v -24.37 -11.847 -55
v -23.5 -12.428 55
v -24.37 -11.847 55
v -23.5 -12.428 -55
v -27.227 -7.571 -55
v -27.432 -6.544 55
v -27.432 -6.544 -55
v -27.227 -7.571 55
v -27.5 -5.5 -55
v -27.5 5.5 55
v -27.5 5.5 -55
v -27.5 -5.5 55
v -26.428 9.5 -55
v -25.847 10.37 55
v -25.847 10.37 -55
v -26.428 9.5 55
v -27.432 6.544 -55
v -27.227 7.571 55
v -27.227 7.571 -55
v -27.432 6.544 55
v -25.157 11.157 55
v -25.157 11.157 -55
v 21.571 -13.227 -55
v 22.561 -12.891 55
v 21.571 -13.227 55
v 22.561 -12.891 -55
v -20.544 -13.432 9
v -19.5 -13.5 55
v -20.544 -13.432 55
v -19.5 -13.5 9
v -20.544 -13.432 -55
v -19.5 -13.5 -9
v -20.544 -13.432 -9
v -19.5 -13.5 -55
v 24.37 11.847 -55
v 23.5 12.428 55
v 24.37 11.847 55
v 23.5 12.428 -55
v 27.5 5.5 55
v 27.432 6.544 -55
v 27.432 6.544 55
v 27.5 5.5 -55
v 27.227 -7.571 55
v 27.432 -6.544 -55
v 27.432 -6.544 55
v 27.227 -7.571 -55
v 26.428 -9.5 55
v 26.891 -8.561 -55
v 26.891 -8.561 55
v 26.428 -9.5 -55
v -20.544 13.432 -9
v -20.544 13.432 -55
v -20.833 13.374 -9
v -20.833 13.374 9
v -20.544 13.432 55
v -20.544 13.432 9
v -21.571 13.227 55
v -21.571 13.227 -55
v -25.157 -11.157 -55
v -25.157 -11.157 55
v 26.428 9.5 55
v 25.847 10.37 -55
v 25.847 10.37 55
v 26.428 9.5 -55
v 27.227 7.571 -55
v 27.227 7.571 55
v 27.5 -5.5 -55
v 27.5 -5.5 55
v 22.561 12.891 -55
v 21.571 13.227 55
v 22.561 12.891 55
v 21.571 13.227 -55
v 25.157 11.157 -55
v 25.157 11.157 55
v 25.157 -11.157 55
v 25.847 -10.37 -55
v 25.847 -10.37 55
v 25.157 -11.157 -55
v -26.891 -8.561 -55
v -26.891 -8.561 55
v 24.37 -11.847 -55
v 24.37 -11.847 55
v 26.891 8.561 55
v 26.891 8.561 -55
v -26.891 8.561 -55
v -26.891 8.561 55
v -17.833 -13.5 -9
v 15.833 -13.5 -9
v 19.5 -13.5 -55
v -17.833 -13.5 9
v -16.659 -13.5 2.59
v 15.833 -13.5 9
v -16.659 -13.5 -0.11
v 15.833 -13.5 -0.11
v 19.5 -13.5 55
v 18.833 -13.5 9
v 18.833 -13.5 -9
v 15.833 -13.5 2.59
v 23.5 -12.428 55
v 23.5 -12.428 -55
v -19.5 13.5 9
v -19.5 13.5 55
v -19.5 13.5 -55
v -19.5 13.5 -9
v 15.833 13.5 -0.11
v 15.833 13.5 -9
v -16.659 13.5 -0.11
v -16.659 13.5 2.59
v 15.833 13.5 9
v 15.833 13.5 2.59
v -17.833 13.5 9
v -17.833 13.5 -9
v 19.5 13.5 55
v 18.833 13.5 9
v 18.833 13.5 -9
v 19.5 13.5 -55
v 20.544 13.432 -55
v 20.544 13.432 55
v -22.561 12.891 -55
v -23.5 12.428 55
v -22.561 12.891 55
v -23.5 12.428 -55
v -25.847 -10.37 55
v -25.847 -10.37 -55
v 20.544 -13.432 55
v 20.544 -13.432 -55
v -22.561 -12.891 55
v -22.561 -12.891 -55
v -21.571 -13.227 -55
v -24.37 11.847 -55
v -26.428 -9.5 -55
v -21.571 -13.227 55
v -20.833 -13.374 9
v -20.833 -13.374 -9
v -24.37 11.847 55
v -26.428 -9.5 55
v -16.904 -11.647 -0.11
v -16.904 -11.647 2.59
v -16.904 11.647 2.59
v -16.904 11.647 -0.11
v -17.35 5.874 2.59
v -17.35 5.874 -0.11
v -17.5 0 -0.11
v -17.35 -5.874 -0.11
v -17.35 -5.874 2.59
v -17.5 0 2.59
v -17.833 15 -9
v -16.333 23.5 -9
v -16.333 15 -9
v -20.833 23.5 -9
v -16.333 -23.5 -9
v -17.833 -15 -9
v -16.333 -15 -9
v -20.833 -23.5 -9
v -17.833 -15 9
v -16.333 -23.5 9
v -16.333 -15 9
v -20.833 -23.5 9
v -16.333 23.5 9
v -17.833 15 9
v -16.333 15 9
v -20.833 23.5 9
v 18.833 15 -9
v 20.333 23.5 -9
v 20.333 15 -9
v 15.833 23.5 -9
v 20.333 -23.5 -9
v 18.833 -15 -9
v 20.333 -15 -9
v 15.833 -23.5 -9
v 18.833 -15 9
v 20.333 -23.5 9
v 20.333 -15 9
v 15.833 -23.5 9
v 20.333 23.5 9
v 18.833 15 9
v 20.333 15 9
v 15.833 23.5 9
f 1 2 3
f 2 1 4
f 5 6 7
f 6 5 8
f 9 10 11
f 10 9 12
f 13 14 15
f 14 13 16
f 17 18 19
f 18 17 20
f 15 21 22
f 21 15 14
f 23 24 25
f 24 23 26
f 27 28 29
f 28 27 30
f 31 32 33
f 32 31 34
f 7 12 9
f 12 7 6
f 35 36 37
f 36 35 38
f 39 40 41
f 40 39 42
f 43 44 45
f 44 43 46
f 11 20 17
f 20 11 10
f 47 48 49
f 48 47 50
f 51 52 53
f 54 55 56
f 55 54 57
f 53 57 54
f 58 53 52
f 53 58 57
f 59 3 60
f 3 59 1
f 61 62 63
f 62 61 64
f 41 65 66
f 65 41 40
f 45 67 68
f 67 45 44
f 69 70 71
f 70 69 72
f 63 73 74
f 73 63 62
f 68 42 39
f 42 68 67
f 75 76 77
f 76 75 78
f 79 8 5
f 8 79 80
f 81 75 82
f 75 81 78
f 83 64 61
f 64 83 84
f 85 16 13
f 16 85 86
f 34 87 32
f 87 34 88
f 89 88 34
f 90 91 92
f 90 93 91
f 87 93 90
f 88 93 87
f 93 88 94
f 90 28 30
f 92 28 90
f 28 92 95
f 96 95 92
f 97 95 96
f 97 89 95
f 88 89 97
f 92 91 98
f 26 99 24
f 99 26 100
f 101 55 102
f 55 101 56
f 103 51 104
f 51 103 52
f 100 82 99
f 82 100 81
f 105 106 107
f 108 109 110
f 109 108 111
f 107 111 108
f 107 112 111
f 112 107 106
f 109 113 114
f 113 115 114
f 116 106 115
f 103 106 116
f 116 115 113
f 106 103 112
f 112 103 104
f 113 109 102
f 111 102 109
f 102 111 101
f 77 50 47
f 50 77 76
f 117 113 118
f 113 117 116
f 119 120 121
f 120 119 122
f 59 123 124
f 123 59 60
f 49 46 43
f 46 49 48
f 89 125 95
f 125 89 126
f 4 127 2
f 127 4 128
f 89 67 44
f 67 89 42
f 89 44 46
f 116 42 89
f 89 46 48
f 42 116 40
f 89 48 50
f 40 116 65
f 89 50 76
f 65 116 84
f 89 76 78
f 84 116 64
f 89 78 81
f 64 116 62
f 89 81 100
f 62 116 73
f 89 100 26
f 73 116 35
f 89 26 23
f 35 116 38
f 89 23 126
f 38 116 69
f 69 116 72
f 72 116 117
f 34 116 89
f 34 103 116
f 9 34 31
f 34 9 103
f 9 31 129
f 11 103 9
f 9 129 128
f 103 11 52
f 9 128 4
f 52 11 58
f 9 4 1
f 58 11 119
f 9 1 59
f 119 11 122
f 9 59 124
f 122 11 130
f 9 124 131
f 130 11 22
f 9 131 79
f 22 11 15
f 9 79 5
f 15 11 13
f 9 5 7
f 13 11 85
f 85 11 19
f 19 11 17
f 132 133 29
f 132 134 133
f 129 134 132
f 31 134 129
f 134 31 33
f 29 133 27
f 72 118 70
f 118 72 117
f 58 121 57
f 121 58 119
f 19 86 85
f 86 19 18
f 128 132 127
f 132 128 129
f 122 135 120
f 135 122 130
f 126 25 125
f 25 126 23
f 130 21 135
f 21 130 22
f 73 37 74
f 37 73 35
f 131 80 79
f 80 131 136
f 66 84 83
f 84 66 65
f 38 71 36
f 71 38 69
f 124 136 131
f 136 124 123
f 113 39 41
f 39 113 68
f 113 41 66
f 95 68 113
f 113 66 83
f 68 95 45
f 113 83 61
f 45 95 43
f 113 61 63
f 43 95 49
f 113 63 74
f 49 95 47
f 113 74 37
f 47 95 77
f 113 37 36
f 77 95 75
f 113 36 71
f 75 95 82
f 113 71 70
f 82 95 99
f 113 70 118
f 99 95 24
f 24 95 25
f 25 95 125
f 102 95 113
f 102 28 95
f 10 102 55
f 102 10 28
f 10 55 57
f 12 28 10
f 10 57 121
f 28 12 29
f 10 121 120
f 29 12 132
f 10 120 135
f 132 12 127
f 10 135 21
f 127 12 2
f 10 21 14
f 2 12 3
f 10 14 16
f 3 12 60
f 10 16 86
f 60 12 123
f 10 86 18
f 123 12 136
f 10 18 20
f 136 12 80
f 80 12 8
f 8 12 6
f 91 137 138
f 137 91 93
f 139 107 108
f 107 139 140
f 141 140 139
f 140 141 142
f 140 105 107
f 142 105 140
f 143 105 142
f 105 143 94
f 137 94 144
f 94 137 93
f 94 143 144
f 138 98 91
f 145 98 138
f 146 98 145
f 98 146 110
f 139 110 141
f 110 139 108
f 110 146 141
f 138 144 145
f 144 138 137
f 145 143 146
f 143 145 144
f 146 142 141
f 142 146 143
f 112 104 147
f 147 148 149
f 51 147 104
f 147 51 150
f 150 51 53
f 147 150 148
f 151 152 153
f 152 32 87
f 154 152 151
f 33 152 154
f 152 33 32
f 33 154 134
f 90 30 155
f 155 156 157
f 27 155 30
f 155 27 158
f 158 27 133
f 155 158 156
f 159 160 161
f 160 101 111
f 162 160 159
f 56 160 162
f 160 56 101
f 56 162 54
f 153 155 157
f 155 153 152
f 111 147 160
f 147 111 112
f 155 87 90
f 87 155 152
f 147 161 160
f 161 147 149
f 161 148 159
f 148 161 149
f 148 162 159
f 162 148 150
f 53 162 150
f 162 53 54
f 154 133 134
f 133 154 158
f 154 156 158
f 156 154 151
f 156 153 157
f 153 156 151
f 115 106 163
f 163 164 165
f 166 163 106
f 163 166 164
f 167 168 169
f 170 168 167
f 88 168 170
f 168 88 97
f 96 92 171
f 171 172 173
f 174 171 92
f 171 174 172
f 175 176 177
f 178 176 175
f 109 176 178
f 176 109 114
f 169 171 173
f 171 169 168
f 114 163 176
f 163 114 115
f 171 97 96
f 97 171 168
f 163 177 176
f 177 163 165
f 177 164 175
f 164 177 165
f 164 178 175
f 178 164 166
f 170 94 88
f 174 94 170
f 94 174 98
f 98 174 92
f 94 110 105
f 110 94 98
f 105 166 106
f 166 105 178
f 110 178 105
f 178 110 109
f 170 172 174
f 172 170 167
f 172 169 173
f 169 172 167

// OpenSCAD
// Ford-style badge CLIP-ON holder for old bumper — blank badge mount.
// Pleading Sanity / P.S Studio · 17 Nov 2026
// A C-clip that pushes onto a bumper slat/grille edge, with a flat face and
// a recessed blank oval so you can fit your own legally-obtained badge.
// NO Ford logo is modelled — trademark. Generic clip + blank mount only.
// MATERIAL: PETG or ASA (car heat/UV). NOT PLA. Fit-check a single clip first.
// 0.2mm layers, 4 walls, supports under the C-clip hooks.

$fn = 48;

// ---- MEASURE YOUR BUMPER SLAT / EDGE AND EDIT THESE ----
face_w        = 110;   // mm — width of the visible badge plate
face_h        = 55;    // mm — height of the visible badge plate
face_t        = 5;     // mm — thickness of the plate
edge_thick    = 5;     // mm — thickness of the bumper slat/edge the clip grips
clip_lip      = 3;     // mm — hook lip that grabs behind the edge
clip_gap      = 0.5;   // mm — push-fit clearance
clip_count    = 2;     // number of C-clips on the back (evenly spaced)
clip_width    = 18;    // mm — width of each C-clip
badge_oval_w  = 90;    // mm — width of blank badge recess (measure your badge)
badge_oval_h  = 35;    // mm — height of blank badge recess
badge_d       = 2.5;   // mm — recess depth
corner_r      = 8;     // mm — plate corner radius
// -------------------------------------------------------

grip = edge_thick + clip_gap;

// plate body (rounded rect, extruded along X = width)
module plate() {
  difference() {
    linear_extrude(face_w, center=true)
    hull() {
      for (dy = [-face_h/2+corner_r, face_h/2-corner_r])
        for (dz = [-face_t/2+corner_r, face_t/2-corner_r])
          translate([dy, dz]) circle(r=corner_r);
    }
    // blank oval badge recess on front (+Z face), not through
    translate([0, 0, face_t/2 - badge_d/2 - 0.01])
    scale([1, badge_oval_w/badge_oval_h, 1])
    cylinder(d=badge_oval_h, h=badge_d+0.2, center=true);
  }
}

// one C-clip, centred at X=0, gripping edge of thickness `grip`
module cclip() {
  y0 = -face_h/2 + 4;
  y1 =  face_h/2 - 4;
  z_back = -face_t/2;        // toward bumper
  z_front = face_t/2 - 0.5;  // bonded to plate
  linear_extrude(clip_width, center=true)
  polygon(points=[
    [z_back,  y0],
    [z_back,  y1],
    [z_front, y1],
    [z_front, y1 - clip_lip - grip],
    [z_back + clip_lip, y1 - clip_lip - grip],
    [z_back + clip_lip, y0 + clip_lip + grip],
    [z_front, y0 + clip_lip + grip],
    [z_front, y0],
  ]);
}

plate();

spacing = face_w / (clip_count + 1);
for (i = [1:clip_count]) {
  x = -face_w/2 + i*spacing;
  translate([x, 0, 0]) cclip();
}

// PRINT: plate flat on bed, clips up, supports on hooks. PETG/ASA only.
